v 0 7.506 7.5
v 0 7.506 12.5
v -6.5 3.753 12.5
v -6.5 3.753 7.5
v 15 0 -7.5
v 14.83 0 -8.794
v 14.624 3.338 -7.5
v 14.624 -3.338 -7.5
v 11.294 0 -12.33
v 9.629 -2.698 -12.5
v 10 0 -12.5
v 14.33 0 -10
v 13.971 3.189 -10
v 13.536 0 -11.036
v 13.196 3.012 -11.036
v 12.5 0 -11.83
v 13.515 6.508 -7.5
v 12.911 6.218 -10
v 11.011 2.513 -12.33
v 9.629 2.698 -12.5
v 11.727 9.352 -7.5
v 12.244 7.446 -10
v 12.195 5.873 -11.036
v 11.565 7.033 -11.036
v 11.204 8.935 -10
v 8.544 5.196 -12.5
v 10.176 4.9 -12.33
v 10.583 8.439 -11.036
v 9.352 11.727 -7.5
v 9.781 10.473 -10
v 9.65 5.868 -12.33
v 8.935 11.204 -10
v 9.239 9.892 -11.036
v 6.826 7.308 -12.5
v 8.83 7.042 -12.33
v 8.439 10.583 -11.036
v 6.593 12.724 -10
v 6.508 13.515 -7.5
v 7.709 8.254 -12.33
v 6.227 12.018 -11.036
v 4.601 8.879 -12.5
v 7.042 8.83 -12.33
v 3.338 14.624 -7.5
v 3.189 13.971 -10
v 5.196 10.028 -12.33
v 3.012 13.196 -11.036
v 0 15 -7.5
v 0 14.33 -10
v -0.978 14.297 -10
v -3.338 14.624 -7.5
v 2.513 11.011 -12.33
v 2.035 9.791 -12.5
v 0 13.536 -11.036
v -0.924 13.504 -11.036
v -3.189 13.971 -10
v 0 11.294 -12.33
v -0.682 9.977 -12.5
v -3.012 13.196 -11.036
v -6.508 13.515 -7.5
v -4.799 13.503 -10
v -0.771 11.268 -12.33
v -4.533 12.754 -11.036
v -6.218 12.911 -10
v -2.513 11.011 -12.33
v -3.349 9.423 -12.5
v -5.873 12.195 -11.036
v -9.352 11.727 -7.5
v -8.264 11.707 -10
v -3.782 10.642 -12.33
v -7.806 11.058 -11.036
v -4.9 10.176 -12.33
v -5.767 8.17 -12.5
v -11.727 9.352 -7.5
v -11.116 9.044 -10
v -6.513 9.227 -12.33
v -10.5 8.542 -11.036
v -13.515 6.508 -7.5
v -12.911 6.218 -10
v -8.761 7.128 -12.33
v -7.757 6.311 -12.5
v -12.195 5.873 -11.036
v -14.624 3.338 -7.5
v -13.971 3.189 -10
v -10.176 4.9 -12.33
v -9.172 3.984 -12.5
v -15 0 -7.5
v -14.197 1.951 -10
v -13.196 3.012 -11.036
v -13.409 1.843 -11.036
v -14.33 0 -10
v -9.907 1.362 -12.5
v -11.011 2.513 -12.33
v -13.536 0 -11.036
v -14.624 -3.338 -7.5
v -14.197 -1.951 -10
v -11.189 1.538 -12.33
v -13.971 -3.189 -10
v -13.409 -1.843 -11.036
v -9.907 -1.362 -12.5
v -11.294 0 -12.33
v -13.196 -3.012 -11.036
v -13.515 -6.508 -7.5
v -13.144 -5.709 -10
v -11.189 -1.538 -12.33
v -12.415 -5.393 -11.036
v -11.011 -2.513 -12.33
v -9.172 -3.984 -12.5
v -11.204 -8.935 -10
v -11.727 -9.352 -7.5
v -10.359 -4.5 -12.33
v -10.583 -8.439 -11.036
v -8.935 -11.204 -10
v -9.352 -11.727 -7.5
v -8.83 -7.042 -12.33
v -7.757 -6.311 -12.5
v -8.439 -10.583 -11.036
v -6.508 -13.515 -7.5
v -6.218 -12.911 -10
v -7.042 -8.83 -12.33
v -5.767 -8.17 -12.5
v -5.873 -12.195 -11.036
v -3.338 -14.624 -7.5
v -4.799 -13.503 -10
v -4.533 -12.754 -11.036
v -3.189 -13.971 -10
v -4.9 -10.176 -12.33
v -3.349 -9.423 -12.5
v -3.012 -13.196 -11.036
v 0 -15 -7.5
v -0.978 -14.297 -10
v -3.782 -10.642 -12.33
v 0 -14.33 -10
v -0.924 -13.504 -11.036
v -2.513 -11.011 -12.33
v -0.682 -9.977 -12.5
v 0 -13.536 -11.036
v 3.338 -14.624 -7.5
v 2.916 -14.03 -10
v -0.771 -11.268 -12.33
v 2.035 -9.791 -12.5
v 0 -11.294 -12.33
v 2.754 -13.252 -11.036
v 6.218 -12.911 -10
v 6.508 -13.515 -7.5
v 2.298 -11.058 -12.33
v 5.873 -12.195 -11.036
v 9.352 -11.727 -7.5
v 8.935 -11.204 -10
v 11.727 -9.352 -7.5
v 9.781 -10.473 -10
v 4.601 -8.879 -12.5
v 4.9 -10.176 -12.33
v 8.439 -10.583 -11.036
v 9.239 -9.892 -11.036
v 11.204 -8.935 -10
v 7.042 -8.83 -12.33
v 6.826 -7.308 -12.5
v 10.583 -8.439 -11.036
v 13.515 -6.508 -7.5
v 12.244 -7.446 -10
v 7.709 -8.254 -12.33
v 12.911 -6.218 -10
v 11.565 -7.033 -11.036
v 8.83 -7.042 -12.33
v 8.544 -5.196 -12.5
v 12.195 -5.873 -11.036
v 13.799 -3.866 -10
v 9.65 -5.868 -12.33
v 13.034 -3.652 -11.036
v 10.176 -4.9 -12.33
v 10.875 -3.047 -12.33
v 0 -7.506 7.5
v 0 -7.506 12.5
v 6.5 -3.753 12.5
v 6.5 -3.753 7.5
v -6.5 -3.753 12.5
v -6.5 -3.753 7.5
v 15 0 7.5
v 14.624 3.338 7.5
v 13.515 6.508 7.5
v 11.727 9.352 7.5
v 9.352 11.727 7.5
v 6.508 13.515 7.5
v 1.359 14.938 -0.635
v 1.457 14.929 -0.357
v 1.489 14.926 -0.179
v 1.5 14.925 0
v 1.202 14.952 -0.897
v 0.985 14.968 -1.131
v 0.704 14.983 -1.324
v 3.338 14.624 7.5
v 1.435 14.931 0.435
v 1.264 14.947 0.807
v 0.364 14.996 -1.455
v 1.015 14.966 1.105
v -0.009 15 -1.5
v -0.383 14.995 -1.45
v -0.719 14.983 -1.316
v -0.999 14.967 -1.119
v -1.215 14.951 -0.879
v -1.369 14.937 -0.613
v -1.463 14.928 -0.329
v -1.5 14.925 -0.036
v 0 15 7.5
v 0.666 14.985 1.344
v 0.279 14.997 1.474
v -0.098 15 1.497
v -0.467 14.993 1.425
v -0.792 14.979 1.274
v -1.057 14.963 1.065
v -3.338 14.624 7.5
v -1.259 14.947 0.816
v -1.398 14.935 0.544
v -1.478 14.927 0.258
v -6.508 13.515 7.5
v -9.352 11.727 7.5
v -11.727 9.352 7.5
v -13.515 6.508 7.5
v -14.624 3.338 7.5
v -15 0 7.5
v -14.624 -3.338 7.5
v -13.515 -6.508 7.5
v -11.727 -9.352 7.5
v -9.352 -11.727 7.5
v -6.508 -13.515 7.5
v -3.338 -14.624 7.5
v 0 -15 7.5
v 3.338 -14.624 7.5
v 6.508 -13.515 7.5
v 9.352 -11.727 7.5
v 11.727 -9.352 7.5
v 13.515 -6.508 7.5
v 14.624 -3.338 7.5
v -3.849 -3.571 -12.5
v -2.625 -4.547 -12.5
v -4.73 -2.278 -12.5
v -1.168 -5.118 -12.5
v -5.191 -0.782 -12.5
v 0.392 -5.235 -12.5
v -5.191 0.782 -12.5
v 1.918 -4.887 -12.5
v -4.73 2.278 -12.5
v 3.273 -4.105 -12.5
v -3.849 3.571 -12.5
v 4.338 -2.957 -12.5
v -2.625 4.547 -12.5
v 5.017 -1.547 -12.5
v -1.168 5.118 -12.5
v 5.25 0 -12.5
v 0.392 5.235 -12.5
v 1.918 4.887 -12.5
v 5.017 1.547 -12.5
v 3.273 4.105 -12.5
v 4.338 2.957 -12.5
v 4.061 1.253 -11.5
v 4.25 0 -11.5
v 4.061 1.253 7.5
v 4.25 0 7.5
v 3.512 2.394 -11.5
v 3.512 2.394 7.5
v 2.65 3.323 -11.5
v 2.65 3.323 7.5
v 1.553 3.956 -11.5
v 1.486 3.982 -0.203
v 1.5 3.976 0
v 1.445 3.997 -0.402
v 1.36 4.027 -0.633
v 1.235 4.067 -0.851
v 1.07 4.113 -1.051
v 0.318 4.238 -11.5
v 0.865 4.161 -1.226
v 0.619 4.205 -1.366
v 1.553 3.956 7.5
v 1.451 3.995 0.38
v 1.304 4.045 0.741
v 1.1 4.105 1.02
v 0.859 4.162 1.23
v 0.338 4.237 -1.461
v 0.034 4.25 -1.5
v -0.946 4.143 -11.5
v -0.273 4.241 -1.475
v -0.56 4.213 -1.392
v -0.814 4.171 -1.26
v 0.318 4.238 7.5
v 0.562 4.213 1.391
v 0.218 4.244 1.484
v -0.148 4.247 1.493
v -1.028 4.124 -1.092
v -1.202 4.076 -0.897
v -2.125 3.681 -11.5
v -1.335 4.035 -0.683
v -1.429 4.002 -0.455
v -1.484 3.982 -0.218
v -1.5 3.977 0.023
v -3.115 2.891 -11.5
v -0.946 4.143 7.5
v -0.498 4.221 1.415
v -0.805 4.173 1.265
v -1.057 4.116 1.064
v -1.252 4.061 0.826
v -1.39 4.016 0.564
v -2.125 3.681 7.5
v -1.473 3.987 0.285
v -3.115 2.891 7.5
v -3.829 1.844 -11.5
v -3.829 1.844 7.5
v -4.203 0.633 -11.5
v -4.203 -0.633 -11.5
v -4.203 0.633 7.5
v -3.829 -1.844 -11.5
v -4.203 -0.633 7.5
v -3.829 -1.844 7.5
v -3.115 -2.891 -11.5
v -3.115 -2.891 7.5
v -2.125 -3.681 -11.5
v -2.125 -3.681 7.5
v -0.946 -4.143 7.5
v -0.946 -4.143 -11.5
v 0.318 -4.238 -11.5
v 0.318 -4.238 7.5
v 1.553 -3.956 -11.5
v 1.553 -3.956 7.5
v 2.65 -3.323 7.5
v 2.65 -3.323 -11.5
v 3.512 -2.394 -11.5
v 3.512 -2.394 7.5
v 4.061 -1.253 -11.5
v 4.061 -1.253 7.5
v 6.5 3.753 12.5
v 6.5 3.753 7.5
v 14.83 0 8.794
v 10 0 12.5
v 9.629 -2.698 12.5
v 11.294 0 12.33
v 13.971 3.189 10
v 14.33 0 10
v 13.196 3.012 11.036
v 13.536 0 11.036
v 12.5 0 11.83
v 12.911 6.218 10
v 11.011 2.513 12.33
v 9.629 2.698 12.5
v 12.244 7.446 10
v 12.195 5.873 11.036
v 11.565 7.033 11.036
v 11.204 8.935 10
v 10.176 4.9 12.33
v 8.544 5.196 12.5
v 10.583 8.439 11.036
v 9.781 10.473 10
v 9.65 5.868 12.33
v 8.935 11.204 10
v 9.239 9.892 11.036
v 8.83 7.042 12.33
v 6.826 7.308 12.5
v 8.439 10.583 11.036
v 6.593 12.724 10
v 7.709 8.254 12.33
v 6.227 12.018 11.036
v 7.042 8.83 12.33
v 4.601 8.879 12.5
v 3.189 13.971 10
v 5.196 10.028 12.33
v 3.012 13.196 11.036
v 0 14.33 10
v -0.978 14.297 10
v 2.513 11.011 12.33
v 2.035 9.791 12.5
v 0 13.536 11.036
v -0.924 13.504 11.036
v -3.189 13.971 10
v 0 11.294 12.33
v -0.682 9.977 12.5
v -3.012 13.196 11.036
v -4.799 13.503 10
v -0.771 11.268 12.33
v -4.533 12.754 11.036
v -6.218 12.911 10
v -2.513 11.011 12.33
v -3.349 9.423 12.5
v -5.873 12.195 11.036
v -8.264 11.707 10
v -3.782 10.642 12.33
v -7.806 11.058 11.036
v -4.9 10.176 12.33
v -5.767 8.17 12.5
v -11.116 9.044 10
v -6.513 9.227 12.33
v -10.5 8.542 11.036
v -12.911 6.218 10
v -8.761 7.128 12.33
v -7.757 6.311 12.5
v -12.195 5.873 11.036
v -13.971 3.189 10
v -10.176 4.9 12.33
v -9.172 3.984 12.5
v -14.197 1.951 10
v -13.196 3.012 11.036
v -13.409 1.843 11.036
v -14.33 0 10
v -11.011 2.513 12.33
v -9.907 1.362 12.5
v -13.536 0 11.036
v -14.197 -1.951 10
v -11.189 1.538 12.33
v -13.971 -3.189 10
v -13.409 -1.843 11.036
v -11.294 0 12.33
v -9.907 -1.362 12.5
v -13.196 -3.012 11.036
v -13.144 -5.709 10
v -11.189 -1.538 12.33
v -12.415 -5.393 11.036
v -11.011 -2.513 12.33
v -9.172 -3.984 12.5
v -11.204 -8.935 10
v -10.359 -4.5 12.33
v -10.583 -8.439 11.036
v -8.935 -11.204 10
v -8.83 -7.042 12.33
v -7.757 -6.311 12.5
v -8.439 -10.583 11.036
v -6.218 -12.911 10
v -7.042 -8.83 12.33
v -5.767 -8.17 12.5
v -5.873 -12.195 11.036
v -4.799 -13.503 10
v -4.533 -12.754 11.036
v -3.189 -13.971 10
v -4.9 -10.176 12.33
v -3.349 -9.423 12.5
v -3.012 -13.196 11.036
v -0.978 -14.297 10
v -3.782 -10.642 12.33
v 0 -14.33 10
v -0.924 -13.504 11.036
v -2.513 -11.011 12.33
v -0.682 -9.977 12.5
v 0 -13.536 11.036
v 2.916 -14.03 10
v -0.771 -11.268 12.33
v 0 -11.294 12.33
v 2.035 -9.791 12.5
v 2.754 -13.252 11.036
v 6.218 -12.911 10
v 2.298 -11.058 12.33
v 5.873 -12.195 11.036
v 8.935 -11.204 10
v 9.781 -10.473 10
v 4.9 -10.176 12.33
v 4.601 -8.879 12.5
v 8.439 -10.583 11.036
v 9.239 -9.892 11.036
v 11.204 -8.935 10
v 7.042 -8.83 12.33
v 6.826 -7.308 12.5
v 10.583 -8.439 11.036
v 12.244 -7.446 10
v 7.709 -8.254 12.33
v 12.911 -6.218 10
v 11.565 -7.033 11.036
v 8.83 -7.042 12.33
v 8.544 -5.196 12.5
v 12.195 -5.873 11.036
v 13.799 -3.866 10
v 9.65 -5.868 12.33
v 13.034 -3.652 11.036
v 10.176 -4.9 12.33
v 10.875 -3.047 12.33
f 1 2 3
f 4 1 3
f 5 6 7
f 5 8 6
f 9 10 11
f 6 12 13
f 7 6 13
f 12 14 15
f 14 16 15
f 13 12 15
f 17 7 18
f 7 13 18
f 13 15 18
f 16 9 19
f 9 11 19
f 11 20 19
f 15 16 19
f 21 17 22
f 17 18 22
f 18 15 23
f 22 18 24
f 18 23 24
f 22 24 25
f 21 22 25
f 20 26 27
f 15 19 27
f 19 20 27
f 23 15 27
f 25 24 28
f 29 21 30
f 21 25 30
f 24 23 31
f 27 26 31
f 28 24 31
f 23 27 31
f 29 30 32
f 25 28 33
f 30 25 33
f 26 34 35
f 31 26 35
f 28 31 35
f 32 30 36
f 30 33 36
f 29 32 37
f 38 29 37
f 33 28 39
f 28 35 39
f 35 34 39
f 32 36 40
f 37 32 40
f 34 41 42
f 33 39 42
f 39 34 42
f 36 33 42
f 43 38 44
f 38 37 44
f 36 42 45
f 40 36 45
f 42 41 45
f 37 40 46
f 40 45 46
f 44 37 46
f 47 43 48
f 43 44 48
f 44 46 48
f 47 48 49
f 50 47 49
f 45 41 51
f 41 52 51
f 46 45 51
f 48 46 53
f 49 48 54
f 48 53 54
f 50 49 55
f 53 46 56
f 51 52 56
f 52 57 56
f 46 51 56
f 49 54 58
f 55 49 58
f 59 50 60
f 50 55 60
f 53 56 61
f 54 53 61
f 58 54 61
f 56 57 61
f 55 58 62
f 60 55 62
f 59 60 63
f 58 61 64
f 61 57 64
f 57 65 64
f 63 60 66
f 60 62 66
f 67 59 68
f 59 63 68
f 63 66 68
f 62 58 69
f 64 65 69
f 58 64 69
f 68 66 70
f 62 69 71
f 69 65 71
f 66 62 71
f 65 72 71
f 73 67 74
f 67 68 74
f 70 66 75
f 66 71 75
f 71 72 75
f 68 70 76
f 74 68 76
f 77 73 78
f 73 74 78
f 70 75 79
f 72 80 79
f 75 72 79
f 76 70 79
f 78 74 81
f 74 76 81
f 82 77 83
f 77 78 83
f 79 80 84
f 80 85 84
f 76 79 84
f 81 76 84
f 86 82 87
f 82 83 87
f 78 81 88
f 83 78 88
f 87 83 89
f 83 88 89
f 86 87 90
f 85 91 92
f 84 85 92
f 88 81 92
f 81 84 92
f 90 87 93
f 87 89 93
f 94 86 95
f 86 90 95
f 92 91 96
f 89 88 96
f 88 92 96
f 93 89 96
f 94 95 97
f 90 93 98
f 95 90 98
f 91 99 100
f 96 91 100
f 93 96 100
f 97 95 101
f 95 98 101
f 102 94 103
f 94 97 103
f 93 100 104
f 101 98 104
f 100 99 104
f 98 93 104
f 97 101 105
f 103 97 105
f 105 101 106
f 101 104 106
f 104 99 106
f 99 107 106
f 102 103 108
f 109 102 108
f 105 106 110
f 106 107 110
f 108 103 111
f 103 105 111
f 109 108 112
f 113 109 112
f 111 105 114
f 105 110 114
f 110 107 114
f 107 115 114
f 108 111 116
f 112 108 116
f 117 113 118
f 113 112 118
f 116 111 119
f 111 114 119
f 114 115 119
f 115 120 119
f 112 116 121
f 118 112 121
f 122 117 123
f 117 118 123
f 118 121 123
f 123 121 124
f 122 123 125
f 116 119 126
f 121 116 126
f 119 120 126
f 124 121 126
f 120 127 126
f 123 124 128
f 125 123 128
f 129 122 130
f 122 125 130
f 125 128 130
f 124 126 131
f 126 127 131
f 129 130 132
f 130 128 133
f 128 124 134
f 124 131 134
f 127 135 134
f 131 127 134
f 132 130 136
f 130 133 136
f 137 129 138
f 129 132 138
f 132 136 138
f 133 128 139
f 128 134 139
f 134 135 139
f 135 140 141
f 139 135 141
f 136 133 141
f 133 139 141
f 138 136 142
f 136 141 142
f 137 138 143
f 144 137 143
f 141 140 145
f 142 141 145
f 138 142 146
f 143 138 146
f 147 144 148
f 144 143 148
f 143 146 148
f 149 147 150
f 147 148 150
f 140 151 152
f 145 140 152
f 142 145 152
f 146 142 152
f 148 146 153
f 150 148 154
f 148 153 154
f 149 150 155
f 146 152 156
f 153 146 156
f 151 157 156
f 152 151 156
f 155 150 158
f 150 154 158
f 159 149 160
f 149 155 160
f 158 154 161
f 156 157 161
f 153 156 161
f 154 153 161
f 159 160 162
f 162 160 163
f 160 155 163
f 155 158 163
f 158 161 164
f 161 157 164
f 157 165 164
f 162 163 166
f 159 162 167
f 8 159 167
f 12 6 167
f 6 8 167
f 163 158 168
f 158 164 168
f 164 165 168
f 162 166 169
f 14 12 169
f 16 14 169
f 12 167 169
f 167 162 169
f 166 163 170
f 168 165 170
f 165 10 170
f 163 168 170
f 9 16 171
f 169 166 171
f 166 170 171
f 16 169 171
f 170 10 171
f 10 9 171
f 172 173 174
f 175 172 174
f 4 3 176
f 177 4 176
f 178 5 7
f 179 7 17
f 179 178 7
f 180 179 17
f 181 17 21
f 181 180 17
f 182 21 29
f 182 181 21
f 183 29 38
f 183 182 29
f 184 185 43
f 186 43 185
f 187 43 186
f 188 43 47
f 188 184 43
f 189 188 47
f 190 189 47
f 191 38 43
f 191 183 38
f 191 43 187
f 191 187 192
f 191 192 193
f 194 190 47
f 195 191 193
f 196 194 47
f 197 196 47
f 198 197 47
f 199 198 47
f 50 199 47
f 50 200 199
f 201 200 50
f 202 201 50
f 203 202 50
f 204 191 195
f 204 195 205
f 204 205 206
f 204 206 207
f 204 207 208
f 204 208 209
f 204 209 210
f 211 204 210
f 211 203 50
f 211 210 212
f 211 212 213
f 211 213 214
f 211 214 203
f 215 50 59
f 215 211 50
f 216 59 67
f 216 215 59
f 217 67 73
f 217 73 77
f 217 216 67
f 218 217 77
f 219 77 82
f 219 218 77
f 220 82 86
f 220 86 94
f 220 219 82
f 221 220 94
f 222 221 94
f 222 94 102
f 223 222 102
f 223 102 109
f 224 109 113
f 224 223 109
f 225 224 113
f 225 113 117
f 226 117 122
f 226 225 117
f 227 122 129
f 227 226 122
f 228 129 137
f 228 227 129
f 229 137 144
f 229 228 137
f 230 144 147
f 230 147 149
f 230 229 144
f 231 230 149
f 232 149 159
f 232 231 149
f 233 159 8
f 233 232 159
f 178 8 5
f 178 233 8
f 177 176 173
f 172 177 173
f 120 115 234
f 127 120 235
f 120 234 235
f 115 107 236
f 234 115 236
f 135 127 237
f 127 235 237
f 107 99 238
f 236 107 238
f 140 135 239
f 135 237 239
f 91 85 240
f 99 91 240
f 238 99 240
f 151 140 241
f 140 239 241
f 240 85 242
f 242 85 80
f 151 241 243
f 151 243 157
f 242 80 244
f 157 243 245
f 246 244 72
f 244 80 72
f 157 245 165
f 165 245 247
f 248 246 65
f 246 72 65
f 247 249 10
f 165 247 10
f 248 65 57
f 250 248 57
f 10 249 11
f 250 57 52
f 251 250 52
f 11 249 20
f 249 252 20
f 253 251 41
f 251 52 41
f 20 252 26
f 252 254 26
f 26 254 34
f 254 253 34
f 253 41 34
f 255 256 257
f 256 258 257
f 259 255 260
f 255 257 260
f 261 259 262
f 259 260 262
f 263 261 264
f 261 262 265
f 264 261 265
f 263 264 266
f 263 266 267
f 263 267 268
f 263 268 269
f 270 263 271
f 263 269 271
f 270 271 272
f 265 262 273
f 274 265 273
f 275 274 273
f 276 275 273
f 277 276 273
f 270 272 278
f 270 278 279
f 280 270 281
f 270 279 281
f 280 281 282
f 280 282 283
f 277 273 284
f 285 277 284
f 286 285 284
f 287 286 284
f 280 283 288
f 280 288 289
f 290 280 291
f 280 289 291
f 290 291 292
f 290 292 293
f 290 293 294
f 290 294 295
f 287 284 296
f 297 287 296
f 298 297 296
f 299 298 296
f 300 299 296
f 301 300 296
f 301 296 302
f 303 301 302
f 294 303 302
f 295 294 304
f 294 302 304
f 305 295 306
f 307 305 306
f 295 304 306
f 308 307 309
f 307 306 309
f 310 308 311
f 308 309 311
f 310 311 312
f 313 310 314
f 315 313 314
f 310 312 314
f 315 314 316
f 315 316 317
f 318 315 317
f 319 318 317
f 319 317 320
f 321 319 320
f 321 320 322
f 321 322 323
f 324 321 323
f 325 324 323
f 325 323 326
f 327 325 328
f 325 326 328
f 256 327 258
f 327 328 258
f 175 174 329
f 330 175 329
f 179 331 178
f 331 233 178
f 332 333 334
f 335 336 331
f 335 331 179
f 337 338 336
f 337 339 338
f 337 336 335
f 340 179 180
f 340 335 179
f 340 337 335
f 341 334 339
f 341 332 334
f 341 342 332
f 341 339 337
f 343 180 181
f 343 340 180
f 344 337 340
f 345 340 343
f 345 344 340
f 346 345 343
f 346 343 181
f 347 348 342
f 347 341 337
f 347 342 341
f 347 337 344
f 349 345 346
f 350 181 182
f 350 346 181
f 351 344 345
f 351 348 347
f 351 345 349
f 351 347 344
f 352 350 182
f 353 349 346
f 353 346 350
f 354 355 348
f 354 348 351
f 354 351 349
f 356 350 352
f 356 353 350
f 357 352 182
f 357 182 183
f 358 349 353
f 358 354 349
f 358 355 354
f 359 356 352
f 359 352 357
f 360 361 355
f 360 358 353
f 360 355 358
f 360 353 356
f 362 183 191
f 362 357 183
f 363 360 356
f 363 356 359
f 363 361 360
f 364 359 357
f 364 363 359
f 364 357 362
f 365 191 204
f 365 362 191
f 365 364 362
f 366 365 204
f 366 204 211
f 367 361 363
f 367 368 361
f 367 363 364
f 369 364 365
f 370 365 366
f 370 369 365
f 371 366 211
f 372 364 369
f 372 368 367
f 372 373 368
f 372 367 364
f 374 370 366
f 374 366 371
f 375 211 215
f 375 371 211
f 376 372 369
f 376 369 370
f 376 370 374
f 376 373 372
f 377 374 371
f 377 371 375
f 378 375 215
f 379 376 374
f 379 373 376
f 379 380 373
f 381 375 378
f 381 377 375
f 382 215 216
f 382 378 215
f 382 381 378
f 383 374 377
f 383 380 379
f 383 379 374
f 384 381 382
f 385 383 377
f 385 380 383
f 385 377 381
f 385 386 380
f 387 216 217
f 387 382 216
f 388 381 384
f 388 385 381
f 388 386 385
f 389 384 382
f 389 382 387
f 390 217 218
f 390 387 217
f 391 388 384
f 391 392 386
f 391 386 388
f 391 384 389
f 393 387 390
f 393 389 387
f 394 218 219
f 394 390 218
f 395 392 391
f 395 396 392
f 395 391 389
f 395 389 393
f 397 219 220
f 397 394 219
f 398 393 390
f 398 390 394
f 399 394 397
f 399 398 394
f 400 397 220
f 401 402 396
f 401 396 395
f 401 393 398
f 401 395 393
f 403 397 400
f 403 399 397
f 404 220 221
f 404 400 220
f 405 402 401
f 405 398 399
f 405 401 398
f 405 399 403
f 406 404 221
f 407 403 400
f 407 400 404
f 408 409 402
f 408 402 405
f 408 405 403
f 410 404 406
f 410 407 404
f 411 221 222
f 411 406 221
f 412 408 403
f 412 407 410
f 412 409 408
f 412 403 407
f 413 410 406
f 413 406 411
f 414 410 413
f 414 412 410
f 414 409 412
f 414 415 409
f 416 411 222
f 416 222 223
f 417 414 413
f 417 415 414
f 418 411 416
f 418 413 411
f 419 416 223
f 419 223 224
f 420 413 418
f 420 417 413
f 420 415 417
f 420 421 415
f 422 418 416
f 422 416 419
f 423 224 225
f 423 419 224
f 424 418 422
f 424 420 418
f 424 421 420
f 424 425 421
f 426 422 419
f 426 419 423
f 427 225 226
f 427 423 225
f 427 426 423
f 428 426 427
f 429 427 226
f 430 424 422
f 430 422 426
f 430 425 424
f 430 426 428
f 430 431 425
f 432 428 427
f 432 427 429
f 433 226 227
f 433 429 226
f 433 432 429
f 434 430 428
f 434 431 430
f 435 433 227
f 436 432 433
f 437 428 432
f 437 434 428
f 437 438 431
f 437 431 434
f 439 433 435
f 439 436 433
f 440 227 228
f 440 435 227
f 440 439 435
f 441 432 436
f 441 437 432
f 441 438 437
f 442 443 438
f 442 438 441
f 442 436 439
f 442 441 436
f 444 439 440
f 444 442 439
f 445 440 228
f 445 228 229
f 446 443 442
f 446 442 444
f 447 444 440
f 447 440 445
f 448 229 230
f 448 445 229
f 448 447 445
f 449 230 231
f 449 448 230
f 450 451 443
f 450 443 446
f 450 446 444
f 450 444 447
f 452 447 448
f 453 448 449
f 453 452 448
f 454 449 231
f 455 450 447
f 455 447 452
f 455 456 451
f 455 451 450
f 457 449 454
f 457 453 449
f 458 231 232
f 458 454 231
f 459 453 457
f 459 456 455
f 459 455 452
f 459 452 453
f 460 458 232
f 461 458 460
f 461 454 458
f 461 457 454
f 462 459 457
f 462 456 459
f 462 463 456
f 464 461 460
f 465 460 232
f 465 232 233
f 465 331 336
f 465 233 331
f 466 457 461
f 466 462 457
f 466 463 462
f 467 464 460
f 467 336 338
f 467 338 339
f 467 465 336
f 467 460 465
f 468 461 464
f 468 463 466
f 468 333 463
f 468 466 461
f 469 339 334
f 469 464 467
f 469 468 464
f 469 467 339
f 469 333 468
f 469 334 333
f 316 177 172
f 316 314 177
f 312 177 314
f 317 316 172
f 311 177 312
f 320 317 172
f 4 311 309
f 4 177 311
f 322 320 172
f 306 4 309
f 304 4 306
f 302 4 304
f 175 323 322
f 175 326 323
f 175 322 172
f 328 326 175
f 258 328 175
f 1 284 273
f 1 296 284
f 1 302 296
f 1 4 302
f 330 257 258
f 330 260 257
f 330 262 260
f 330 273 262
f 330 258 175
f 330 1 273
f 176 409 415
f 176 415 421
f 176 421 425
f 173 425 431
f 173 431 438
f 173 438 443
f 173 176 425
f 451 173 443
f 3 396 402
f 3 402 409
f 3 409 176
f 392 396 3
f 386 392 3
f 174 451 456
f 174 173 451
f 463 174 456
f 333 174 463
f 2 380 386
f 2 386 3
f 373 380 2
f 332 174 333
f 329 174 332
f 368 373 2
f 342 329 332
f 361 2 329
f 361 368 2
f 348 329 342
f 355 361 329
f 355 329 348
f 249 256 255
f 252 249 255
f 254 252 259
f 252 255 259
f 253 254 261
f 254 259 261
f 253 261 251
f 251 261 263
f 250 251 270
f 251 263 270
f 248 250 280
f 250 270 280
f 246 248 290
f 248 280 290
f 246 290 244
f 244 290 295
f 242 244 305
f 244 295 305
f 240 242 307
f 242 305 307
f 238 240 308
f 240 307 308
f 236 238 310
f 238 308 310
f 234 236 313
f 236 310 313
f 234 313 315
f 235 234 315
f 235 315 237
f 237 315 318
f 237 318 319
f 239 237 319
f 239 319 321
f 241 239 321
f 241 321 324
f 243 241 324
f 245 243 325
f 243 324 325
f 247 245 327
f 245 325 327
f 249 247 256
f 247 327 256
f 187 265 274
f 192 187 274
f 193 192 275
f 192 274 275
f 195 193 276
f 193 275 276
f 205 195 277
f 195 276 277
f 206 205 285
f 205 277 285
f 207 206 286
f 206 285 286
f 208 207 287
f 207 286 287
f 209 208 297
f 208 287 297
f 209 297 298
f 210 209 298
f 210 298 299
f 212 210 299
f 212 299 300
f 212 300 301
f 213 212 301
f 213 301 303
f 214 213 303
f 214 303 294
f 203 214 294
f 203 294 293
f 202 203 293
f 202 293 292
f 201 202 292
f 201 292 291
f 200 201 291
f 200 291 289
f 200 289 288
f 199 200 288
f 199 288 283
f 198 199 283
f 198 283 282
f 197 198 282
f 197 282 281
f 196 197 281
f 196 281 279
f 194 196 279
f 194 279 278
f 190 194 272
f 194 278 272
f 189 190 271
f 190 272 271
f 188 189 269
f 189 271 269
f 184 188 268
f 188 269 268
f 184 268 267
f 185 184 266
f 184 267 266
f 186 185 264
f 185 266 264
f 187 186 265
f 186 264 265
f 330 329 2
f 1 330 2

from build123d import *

# Parameters (mm, degrees)
F0_R     = 15
F1_DEPTH = 12.5
F3_DEPTH = 5
F4_R     = 4.25
F5_DEPTH = 20.001
F6_R     = 5
F7_SIZE  = 1
F8_R     = 1.5
F9_DEPTH = 50


with BuildPart() as f1:
    # F0 (on Top) → F1 (new body, symmetric)
    with BuildSketch(Plane.XY):
        Circle(F0_R)
    extrude(amount=F1_DEPTH, both=True)

    # F2 (on face) → F3 (cut)
    with BuildSketch(Plane.XY.offset(12.5)):
        Polygon((6.5, -3.752777), (6.5, 3.752777), (0, 7.505553), (-6.5, 3.752777), (-6.5, -3.752777), (0, -7.505553), align=None)
    extrude(amount=-F3_DEPTH, mode=Mode.SUBTRACT)

    # F4 (on face) → F5 (cut, through all)
    with BuildSketch(Plane.XY.offset(7.5)):
        Circle(F4_R)
    extrude(amount=-F5_DEPTH, mode=Mode.SUBTRACT)

    # F6
    f6_edges = [f1.edges().sort_by_distance(p)[0] for p in [
        (-15, 0, 12.5),
        (-15, 0, -12.5),
    ]]
    fillet(f6_edges, radius=F6_R)

    # F7
    f7_edges = [f1.edges().sort_by_distance(p)[0] for p in [
        (-4.25, 0, -12.5),
    ]]
    chamfer(f7_edges, length=F7_SIZE)

    # F8 (on Front) → F9 (cut)
    with BuildSketch(Plane.XZ):
        Circle(F8_R)
    extrude(amount=-F9_DEPTH, mode=Mode.SUBTRACT)


solid = f1.part
